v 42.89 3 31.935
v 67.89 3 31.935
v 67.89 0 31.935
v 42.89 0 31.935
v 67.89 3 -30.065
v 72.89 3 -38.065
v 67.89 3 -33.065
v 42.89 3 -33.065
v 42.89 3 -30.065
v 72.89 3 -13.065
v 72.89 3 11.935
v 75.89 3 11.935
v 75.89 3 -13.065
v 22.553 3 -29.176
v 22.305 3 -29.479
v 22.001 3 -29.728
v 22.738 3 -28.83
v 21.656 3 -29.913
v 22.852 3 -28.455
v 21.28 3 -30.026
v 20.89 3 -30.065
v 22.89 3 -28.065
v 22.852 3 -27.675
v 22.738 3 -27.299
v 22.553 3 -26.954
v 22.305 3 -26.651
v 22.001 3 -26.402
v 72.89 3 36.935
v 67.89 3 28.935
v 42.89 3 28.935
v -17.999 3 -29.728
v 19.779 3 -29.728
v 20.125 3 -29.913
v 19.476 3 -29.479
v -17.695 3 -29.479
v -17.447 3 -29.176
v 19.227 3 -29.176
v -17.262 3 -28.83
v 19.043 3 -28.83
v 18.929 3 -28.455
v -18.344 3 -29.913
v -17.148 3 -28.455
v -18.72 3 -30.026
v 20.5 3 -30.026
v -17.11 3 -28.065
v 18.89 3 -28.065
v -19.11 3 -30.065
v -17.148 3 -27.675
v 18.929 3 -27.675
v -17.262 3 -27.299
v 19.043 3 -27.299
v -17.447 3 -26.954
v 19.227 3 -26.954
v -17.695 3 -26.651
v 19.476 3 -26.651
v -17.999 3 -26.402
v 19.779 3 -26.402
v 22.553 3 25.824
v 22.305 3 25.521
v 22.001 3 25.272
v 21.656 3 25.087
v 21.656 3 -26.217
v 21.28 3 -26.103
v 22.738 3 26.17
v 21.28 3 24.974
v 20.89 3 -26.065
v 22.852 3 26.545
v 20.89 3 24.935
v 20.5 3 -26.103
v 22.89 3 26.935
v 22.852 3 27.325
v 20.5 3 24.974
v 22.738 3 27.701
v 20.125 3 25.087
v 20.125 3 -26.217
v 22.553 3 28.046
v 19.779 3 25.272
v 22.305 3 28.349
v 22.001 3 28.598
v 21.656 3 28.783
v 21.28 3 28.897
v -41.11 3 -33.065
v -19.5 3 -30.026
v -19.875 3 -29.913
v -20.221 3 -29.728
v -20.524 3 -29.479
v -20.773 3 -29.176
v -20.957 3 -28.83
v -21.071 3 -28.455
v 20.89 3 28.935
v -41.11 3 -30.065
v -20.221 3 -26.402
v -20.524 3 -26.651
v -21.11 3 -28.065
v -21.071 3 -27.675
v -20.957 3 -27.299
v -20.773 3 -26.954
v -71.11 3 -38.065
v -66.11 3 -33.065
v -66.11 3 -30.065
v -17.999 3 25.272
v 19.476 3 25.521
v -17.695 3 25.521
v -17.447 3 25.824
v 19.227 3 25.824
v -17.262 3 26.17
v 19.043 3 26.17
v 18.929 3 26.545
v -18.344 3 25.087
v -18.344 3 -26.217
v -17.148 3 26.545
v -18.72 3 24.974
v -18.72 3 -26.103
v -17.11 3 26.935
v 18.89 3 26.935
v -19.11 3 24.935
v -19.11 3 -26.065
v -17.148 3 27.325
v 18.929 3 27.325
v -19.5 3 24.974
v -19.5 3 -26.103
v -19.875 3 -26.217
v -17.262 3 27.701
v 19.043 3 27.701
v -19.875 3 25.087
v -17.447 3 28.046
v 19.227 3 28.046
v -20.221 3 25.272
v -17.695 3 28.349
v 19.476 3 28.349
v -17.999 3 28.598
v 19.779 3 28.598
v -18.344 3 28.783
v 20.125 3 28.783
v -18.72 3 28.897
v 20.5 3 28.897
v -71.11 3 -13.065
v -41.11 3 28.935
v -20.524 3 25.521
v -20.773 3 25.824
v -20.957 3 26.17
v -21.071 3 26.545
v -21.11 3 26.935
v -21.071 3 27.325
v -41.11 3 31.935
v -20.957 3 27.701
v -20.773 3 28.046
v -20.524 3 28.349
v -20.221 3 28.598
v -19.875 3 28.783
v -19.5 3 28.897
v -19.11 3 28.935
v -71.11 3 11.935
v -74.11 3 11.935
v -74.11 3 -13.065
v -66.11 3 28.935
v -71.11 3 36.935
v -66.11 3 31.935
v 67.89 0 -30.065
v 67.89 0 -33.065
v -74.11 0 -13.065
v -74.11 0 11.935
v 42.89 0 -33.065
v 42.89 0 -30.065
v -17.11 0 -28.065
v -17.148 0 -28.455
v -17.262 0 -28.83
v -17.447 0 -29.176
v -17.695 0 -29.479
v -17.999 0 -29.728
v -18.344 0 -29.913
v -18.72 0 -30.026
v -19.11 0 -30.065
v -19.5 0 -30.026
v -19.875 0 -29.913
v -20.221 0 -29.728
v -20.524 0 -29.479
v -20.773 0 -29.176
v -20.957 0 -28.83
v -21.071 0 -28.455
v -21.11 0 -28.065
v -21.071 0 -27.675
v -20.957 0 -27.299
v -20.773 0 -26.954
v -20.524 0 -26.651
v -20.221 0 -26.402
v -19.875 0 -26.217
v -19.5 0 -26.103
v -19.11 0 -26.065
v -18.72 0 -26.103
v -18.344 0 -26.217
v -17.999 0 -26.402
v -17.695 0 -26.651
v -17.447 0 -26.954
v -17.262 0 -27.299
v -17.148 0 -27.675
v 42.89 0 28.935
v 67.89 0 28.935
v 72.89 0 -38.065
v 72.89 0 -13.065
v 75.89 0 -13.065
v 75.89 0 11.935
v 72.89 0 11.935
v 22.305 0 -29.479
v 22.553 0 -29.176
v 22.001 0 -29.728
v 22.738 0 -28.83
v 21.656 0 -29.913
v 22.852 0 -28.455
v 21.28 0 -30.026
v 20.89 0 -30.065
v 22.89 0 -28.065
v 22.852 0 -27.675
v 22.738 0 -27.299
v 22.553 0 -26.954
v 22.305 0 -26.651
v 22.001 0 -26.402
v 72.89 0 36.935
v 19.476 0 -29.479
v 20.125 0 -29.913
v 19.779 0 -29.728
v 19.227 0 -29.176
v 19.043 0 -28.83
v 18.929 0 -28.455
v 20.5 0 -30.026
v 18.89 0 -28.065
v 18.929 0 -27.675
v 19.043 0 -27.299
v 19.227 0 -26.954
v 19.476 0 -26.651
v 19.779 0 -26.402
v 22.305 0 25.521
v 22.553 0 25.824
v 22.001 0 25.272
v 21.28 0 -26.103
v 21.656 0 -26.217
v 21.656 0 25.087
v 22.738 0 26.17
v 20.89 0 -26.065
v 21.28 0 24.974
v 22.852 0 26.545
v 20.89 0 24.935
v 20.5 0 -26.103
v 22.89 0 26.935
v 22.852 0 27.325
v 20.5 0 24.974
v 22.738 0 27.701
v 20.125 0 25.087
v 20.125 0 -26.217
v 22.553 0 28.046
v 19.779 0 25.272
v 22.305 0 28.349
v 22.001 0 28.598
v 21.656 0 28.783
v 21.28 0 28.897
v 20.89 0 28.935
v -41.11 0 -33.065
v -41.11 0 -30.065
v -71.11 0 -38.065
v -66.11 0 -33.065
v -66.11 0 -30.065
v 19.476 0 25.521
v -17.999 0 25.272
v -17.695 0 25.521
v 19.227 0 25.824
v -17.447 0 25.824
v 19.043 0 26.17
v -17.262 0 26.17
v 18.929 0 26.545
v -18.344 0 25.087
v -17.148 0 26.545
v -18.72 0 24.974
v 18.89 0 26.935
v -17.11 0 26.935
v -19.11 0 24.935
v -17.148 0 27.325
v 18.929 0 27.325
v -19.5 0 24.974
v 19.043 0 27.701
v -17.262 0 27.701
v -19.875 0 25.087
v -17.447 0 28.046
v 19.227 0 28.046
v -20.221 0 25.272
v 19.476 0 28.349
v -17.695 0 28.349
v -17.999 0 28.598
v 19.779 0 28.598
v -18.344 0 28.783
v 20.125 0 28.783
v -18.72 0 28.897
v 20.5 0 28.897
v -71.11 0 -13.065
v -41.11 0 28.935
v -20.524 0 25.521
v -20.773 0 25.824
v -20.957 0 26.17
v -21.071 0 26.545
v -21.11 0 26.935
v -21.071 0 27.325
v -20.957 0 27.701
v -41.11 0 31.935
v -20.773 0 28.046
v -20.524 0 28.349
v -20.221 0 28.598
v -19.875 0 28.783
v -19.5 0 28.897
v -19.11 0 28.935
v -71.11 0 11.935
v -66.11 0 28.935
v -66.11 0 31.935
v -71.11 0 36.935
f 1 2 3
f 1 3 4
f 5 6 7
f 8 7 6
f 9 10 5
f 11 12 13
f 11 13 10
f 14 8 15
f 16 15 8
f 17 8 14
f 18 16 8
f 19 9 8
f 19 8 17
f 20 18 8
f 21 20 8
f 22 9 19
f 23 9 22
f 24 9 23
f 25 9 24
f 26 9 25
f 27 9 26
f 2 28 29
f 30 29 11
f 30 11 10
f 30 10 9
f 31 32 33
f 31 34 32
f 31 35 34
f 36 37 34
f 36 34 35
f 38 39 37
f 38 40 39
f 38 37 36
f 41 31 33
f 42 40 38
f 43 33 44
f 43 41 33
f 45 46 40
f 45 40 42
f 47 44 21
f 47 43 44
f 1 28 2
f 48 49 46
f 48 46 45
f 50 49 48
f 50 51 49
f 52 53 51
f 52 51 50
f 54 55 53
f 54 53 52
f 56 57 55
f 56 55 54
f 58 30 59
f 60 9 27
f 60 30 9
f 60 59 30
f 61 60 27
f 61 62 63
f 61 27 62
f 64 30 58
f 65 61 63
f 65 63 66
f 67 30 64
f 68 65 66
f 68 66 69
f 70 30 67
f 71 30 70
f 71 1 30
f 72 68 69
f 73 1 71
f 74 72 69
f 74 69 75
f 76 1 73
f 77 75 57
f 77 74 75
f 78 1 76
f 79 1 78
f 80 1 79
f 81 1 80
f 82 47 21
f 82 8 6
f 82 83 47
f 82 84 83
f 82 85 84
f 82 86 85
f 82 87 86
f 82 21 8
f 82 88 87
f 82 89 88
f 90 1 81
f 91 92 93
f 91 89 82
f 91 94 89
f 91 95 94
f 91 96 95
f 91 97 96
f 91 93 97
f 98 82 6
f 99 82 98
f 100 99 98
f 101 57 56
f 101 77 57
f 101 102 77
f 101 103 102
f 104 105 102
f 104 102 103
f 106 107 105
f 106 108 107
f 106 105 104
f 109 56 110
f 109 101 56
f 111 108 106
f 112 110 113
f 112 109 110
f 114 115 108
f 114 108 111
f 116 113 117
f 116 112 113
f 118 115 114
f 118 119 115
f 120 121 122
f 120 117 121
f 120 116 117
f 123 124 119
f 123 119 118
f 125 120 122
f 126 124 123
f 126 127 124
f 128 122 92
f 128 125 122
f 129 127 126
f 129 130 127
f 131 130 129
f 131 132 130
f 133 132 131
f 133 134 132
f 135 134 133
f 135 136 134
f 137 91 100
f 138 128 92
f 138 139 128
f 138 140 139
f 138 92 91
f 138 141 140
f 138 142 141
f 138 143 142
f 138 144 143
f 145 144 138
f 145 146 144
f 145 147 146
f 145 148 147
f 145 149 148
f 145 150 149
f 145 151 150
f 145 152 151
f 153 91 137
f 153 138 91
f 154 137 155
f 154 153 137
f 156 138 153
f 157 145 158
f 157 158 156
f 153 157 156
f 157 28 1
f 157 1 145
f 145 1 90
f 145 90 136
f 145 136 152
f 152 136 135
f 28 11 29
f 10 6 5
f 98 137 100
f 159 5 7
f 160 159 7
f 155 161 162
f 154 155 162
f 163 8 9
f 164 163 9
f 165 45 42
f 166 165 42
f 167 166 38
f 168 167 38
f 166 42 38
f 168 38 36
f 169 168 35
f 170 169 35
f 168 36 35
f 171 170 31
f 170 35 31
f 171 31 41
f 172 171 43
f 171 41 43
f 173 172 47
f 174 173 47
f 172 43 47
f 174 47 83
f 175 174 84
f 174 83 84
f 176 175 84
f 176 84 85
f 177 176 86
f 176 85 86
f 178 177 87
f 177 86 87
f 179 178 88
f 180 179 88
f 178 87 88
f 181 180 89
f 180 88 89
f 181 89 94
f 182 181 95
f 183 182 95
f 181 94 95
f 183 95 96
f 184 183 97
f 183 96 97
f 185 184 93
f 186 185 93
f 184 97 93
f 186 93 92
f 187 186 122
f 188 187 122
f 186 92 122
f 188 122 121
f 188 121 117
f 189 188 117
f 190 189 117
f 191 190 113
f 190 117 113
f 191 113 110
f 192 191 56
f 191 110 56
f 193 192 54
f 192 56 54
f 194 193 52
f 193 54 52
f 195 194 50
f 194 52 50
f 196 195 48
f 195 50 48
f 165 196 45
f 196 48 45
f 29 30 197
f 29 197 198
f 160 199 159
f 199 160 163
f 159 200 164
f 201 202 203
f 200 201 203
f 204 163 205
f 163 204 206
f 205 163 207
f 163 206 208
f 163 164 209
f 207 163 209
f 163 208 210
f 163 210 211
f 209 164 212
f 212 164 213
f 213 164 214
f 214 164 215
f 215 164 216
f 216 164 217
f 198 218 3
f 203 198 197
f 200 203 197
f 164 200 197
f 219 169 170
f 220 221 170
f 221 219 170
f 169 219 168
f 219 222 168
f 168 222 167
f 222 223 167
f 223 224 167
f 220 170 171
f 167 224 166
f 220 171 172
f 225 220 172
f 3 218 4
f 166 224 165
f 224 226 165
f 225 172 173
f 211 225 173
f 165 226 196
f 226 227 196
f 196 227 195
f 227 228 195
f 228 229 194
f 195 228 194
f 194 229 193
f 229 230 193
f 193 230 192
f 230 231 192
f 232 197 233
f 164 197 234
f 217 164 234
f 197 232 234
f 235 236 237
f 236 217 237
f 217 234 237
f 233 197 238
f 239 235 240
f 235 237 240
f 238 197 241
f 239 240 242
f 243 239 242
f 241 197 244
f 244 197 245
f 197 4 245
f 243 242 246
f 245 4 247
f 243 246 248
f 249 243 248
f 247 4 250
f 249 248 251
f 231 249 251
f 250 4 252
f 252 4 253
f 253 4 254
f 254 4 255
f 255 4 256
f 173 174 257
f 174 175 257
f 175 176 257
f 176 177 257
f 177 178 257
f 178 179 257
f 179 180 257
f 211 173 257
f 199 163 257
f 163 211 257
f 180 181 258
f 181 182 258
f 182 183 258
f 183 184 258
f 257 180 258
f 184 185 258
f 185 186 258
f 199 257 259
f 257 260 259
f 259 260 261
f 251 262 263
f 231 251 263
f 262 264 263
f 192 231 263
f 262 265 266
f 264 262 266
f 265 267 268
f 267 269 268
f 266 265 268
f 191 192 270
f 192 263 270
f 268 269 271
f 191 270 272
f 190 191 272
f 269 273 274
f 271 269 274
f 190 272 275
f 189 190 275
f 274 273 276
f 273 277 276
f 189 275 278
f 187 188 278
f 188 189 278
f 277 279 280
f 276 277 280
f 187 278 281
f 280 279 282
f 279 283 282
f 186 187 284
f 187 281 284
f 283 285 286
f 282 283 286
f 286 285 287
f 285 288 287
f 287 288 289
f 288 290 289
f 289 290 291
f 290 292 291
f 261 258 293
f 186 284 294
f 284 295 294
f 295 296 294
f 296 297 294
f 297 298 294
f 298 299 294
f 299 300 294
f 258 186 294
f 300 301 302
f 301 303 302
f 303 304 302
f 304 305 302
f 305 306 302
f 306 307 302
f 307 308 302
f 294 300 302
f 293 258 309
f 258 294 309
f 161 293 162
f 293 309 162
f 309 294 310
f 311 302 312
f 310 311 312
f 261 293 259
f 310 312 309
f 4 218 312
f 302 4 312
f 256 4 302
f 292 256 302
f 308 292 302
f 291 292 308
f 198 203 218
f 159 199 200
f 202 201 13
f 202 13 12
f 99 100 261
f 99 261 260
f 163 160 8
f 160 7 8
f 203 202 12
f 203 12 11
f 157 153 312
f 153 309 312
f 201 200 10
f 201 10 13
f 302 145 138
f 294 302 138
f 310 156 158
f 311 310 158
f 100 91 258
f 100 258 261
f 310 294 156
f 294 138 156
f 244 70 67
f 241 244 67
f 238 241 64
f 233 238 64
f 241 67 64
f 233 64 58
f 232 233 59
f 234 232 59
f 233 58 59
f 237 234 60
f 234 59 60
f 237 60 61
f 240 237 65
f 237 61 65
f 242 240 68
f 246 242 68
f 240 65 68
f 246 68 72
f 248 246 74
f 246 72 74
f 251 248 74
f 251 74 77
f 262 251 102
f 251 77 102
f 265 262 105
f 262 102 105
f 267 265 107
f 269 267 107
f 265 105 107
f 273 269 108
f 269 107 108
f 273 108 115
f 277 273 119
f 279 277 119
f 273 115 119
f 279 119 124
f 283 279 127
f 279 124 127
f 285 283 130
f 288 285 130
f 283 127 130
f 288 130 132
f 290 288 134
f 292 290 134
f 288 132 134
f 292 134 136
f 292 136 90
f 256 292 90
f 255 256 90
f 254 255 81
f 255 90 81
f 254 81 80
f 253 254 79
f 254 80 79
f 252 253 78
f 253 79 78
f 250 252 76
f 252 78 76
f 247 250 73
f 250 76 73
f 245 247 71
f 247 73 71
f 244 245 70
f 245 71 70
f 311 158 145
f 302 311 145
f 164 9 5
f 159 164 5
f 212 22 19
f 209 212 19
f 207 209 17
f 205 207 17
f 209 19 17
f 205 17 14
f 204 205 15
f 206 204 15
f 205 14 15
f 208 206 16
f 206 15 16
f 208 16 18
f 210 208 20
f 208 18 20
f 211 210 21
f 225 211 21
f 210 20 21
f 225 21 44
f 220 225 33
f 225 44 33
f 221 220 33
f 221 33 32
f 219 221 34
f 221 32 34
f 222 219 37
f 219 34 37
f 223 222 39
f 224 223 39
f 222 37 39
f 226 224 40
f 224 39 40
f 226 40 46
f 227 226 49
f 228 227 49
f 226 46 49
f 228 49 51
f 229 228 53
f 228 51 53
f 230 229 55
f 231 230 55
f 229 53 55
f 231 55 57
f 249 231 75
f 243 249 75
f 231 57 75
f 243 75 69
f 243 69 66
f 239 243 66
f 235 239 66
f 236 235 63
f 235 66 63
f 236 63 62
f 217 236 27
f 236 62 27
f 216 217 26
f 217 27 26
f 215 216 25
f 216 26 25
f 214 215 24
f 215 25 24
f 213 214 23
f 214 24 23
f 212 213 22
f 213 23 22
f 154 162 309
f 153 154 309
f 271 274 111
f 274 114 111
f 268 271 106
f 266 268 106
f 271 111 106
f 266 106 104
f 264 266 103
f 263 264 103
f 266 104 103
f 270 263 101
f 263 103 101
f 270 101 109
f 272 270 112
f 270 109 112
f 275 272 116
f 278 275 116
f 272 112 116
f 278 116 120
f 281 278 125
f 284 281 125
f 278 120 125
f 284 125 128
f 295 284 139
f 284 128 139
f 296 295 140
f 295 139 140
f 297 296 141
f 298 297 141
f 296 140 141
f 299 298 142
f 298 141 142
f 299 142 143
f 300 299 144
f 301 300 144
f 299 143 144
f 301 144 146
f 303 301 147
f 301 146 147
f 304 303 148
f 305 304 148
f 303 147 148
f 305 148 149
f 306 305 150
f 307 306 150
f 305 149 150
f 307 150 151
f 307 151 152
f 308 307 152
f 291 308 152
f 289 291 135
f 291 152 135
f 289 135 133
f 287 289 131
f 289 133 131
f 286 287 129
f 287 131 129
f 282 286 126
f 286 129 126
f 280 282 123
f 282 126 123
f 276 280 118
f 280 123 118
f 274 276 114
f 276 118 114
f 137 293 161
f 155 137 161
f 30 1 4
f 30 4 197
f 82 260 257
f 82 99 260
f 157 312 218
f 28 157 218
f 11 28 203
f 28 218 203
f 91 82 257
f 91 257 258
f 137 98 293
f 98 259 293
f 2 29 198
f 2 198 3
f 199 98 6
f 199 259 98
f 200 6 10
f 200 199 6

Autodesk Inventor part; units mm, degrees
ref_plane "YZ Plane" through (0, 0, 0) normal (1, 0, 0) x (0, 1, 0)
ref_plane "XZ Plane" through (0, 0, 0) normal (0, 1, 0) x (-1, 0, 0)
ref_plane "XY Plane" through (0, 0, 0) normal (0, 0, 1) x (1, 0, 0)
sketch "Sketch1" plane through (0, 0, 0) normal (0, 1, 0) x (-1, 0, 0)
  line L0 (71.1097, -38.0648) -> (71.1097, -13.0648)
  line L1 (71.1097, -13.0648) -> (74.1097, -13.0648)
  line L2 (74.1097, -13.0648) -> (74.1097, 11.9352)
  line L3 (74.1097, 11.9352) -> (71.1097, 11.9352)
  line L4 (71.1097, 11.9352) -> (71.1097, 36.9352)
  line L5 (-72.8903, -38.0648) -> (-72.8903, -13.0648)
  line L6 (-72.8903, 36.9352) -> (-72.8903, 11.9352)
  line L7 (-72.8903, -13.0648) -> (-75.8903, -13.0648)
  line L8 (-75.8903, -13.0648) -> (-75.8903, 11.9352)
  line L9 (-75.8903, 11.9352) -> (-72.8903, 11.9352)
  line L10 (71.1097, -38.0648) -> (-72.8903, -38.0648)
  line L11 (71.1097, 36.9352) -> (-72.8903, 36.9352)
  point P0 (0, 0)
extrude "Extrusion1" add sketch "Sketch1" along normal blind 3
sketch "Sketch2" plane through (0, 3, 0) normal (0, 1, 0) x (1, 0, 0)
  line L0 (-71.1097, -36.9352) -> (72.8903, -36.9352) projected
  line L1 (-66.1097, -31.9352) -> (-56.1097, -31.9352)
  line L2 (-56.1097, -31.9352) -> (-56.1097, -28.9352)
  line L3 (-56.1097, -28.9352) -> (-66.1097, -28.9352)
  line L4 (-66.1097, -28.9352) -> (-66.1097, -31.9352)
  line L5 (72.8903, 38.0648) -> (-71.1097, 38.0648) projected
  line L6 (-56.1097, 30.0648) -> (-66.1097, 30.0648)
  line L7 (-66.1097, 30.0648) -> (-66.1097, 33.0648)
  line L8 (-66.1097, 33.0648) -> (-56.1097, 33.0648)
  line L9 (-56.1097, 33.0648) -> (-56.1097, 30.0648)
  line L10 (67.8903, 33.0648) -> (57.8903, 33.0648)
  line L11 (57.8903, 33.0648) -> (57.8903, 30.0648)
  line L12 (57.8903, 30.0648) -> (67.8903, 30.0648)
  line L13 (67.8903, 30.0648) -> (67.8903, 33.0648)
  line L14 (67.8903, -31.9352) -> (57.8903, -31.9352)
  line L15 (57.8903, -31.9352) -> (57.8903, -28.9352)
  line L16 (57.8903, -28.9352) -> (67.8903, -28.9352)
  line L17 (67.8903, -28.9352) -> (67.8903, -31.9352)
  point P0 (0, 0)
extrude "Extrusion2" cut sketch "Sketch2" against normal blind 30
sketch "Sketch3" plane through (0, 3, 0) normal (0, 1, 0) x (1, 0, 0)
  line L0 (72.8903, 38.0648) -> (-71.1097, 38.0648) projected
  circle A0 centre (-14.1097, 28.0648) radius 5
  circle A1 centre (15.8903, 28.0648) radius 5
  line L1 (-71.1097, -36.9352) -> (72.8903, -36.9352) projected
  circle A2 centre (-14.1097, -26.9352) radius 5
  circle A3 centre (15.8903, -26.9352) radius 5
  point P0 (0, 0)
  dimension "d35" = 10
  dimension "d36" = 10
  dimension "d39" = 10
  dimension "d40" = 10
extrude "Extrusion3" cut sketch "Sketch3" against normal blind 30
sketch "Sketch4" plane through (0, 3, 0) normal (0, 1, 0) x (1, 0, 0)
  line L0 (-56.1097, 33.0648) -> (-56.1097, 30.0648) projected
  line L1 (-56.1097, 33.0648) -> (-41.1097, 33.0648)
  line L2 (-41.1097, 33.0648) -> (-41.1097, 30.0648)
  line L3 (-41.1097, 30.0648) -> (-56.1097, 30.0648)
  line L4 (-56.1097, 30.0648) -> (-56.1097, 33.0648)
  line L5 (57.8903, 33.0648) -> (42.8903, 33.0648)
  line L6 (42.8903, 33.0648) -> (42.8903, 30.0648)
  line L7 (42.8903, 30.0648) -> (57.8903, 30.0648)
  line L8 (57.8903, 30.0648) -> (57.8903, 33.0648)
  line L9 (-56.1097, -31.9352) -> (-66.1097, -31.9352) projected
  line L10 (-56.1097, -31.9352) -> (-41.1097, -31.9352)
  line L11 (-41.1097, -31.9352) -> (-41.1097, -28.9352)
  line L12 (-41.1097, -28.9352) -> (-56.1097, -28.9352)
  line L13 (-56.1097, -28.9352) -> (-56.1097, -31.9352)
  line L14 (57.8903, -31.9352) -> (57.8903, -28.9352) projected
  line L15 (57.8903, -31.9352) -> (42.8903, -31.9352)
  line L16 (42.8903, -31.9352) -> (42.8903, -28.9352)
  line L17 (42.8903, -28.9352) -> (57.8903, -28.9352)
  line L18 (57.8903, -28.9352) -> (57.8903, -31.9352)
  point P0 (0, 0)
  dimension "d43" = 15
  dimension "d44" = 15
extrude "Extrusion4" cut sketch "Sketch4" against normal blind 10
sketch "Sketch5" plane through (0, 3, 0) normal (0, 1, 0) x (1, 0, 0)
  circle A0 centre (-14.1097, 28.0648) radius 5 projected
  circle A1 centre (-14.1097, 28.0648) radius 5
  circle A2 centre (15.8903, 28.0648) radius 5 projected
  circle A3 centre (15.8903, 28.0648) radius 5
  circle A4 centre (15.8903, -26.9352) radius 5 projected
  circle A5 centre (15.8903, -26.9352) radius 5
  circle A6 centre (-14.1097, -26.9352) radius 5 projected
  circle A7 centre (-14.1097, -26.9352) radius 5
  point P0 (0, 0)
extrude "Extrusion5" add sketch "Sketch5" against normal blind 3
sketch "Sketch6" plane through (0, 3, 0) normal (0, 1, 0) x (1, 0, 0)
  line L0 (-74.1097, 13.0648) -> (-74.1097, -11.9352) projected
  line L1 (75.8903, -11.9352) -> (75.8903, 13.0648) projected
  line L2 (72.8903, 38.0648) -> (-71.1097, 38.0648) projected
  line L3 (0.8903, 38.0648) -> (0.8903, -36.9352)
  line L4 (-71.1097, -36.9352) -> (72.8903, -36.9352) projected
  circle A0 centre (-19.1097, 28.0648) radius 2
  circle A1 centre (20.8903, 28.0648) radius 2
  circle A2 centre (-19.1097, -26.9352) radius 2
  circle A3 centre (20.8903, -26.9352) radius 2
  point P0 (0, 0)
extrude "Extrusion6" cut sketch "Sketch6" against normal blind 3
properties part number "Level1 (Motoren)"
